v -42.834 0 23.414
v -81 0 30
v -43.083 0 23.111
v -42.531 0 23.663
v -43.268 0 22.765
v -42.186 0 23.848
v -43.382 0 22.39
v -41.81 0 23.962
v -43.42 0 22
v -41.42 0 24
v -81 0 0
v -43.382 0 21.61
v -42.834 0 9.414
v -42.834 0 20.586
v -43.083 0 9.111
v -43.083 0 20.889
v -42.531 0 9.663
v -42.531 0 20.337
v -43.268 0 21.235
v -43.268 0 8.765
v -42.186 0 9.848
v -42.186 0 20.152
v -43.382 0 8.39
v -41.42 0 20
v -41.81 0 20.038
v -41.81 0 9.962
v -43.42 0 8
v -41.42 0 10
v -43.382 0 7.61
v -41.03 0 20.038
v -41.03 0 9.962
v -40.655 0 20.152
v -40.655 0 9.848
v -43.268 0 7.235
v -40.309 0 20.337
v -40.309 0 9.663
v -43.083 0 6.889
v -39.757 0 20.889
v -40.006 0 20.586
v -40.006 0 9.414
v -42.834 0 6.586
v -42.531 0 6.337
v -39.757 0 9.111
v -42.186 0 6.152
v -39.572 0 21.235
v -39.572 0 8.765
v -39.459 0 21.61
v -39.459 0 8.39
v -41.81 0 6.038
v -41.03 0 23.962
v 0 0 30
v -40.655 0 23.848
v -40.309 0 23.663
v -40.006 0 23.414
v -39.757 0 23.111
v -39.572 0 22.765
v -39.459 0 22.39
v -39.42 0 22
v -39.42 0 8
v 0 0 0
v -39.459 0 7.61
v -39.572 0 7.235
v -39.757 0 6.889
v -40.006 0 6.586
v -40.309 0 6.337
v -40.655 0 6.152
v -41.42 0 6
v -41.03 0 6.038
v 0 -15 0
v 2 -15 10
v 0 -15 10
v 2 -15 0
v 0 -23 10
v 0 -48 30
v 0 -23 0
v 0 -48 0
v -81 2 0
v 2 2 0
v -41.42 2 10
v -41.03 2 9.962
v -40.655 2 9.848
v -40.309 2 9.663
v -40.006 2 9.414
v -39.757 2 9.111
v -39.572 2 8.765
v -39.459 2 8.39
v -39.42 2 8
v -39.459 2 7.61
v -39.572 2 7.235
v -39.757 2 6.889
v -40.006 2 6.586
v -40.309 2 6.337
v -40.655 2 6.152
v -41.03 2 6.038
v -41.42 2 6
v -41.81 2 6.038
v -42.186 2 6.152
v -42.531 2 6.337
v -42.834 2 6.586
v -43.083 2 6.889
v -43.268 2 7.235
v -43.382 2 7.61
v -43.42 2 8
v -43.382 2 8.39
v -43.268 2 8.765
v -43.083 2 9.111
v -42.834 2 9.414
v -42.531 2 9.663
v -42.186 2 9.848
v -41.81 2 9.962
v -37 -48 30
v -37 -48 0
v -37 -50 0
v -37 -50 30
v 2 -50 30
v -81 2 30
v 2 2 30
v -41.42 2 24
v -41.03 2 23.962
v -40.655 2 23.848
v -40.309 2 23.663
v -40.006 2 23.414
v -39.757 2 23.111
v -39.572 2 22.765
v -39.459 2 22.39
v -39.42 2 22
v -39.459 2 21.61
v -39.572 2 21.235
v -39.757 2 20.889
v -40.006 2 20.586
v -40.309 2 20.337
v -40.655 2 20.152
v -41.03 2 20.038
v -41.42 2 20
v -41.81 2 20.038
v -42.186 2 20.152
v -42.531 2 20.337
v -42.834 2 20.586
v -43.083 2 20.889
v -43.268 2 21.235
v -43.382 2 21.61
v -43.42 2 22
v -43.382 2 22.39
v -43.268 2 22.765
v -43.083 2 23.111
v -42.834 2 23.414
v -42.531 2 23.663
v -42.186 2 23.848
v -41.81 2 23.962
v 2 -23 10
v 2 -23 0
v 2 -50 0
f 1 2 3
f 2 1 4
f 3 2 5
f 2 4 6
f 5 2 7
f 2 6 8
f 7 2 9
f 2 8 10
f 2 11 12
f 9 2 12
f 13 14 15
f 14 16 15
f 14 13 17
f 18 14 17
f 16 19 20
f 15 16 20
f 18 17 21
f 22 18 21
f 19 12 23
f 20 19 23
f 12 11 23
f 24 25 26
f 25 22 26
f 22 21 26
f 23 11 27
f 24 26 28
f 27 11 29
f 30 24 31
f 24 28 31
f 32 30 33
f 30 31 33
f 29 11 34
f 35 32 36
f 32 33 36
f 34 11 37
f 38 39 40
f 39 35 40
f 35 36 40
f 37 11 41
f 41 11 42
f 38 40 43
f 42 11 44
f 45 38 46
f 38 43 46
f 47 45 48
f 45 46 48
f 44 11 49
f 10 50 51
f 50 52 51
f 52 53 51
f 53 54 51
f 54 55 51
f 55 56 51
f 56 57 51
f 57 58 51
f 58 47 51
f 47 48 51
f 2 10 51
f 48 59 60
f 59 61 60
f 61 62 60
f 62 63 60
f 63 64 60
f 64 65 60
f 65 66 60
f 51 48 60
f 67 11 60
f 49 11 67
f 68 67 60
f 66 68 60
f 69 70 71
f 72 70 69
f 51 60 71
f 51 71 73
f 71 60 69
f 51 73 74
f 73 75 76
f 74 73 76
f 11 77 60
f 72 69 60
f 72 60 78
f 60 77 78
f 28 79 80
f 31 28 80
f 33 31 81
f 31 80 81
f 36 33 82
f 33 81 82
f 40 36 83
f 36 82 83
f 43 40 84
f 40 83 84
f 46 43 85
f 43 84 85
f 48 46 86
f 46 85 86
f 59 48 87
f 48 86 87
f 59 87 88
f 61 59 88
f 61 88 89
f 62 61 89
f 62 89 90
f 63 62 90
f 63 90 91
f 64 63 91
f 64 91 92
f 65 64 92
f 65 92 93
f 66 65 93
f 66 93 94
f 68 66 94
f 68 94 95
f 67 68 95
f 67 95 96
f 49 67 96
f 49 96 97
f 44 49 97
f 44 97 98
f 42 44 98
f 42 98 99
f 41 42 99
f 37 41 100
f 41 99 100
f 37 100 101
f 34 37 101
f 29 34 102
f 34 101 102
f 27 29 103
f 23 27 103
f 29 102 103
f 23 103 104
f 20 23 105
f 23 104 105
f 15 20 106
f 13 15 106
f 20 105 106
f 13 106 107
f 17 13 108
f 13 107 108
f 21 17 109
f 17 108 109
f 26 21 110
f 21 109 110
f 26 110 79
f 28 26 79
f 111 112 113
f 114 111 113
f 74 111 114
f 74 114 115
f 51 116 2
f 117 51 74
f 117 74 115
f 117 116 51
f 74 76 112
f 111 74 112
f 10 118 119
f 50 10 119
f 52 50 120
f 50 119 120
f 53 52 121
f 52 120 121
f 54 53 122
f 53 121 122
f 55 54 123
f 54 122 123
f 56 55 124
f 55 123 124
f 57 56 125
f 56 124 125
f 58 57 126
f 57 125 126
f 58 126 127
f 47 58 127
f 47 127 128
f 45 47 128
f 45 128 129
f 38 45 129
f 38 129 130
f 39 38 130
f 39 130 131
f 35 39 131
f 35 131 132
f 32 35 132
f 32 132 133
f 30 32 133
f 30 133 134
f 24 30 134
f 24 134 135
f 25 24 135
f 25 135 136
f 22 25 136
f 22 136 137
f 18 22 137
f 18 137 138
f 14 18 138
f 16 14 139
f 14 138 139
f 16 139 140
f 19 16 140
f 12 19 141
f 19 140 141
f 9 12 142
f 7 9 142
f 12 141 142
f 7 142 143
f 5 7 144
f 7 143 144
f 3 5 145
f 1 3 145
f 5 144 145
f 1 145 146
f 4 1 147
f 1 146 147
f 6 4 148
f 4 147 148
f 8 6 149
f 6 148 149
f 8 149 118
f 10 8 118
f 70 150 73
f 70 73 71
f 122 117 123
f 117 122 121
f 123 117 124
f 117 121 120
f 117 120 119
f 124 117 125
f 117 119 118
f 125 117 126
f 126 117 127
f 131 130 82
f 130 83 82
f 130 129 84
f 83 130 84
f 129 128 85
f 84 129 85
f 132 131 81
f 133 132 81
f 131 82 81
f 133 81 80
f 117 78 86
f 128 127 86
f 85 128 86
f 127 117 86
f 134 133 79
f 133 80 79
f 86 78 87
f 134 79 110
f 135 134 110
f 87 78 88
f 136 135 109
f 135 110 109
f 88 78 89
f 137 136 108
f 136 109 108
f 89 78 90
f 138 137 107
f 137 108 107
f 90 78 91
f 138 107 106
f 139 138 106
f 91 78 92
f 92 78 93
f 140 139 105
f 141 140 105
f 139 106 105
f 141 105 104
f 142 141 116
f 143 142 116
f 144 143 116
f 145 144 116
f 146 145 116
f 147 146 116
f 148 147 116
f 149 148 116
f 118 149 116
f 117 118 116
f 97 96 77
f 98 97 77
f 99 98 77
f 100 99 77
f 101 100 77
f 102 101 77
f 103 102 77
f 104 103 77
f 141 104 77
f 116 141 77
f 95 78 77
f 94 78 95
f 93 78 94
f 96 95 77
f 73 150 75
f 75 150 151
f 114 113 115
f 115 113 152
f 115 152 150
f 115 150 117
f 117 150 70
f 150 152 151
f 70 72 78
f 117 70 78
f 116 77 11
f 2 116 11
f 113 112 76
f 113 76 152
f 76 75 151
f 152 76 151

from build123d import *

# Parameters (mm, degrees)
EXTRUDE_1_DEPTH     = 30
SKETCH_3_W          = 10
SKETCH_3_H          = 8
CUT_EXTRUDE_1_DEPTH = 30
SKETCH_4_R          = 2
CUT_EXTRUDE_2_DEPTH = 10


with BuildPart() as part:
    # 草图2 → 拉伸-薄壁1 (new body)
    with BuildSketch(Plane.XY):
        Polygon((-81, 0), (0, 0), (0, -48), (-37, -48), (-37, -50), (2, -50), (2, 2), (-81, 2), align=None)
    extrude(amount=EXTRUDE_1_DEPTH)

    # 草图3 → 切除-拉伸1 (cut)
    with BuildSketch(Plane(origin=(2, 0, 0), x_dir=(0, 0, -1), z_dir=(1, 0, 0))):
        with Locations((-5, -19)):
            Rectangle(SKETCH_3_W, SKETCH_3_H)
    extrude(amount=-CUT_EXTRUDE_1_DEPTH, mode=Mode.SUBTRACT)

    # 草图4 → 切除-拉伸2 (cut)
    with BuildSketch(Plane(origin=(0, 2, 0), x_dir=(1, 0, 0), z_dir=(0, 1, 0))):
        with Locations(Location((-41.420164834, -8, 0), (0, 0, 270))):
            Circle(SKETCH_4_R)
        with Locations(Location((-41.420164834, -22, 0), (0, 0, 270))):
            Circle(SKETCH_4_R)
    extrude(amount=-CUT_EXTRUDE_2_DEPTH, mode=Mode.SUBTRACT)


solid = part.part
